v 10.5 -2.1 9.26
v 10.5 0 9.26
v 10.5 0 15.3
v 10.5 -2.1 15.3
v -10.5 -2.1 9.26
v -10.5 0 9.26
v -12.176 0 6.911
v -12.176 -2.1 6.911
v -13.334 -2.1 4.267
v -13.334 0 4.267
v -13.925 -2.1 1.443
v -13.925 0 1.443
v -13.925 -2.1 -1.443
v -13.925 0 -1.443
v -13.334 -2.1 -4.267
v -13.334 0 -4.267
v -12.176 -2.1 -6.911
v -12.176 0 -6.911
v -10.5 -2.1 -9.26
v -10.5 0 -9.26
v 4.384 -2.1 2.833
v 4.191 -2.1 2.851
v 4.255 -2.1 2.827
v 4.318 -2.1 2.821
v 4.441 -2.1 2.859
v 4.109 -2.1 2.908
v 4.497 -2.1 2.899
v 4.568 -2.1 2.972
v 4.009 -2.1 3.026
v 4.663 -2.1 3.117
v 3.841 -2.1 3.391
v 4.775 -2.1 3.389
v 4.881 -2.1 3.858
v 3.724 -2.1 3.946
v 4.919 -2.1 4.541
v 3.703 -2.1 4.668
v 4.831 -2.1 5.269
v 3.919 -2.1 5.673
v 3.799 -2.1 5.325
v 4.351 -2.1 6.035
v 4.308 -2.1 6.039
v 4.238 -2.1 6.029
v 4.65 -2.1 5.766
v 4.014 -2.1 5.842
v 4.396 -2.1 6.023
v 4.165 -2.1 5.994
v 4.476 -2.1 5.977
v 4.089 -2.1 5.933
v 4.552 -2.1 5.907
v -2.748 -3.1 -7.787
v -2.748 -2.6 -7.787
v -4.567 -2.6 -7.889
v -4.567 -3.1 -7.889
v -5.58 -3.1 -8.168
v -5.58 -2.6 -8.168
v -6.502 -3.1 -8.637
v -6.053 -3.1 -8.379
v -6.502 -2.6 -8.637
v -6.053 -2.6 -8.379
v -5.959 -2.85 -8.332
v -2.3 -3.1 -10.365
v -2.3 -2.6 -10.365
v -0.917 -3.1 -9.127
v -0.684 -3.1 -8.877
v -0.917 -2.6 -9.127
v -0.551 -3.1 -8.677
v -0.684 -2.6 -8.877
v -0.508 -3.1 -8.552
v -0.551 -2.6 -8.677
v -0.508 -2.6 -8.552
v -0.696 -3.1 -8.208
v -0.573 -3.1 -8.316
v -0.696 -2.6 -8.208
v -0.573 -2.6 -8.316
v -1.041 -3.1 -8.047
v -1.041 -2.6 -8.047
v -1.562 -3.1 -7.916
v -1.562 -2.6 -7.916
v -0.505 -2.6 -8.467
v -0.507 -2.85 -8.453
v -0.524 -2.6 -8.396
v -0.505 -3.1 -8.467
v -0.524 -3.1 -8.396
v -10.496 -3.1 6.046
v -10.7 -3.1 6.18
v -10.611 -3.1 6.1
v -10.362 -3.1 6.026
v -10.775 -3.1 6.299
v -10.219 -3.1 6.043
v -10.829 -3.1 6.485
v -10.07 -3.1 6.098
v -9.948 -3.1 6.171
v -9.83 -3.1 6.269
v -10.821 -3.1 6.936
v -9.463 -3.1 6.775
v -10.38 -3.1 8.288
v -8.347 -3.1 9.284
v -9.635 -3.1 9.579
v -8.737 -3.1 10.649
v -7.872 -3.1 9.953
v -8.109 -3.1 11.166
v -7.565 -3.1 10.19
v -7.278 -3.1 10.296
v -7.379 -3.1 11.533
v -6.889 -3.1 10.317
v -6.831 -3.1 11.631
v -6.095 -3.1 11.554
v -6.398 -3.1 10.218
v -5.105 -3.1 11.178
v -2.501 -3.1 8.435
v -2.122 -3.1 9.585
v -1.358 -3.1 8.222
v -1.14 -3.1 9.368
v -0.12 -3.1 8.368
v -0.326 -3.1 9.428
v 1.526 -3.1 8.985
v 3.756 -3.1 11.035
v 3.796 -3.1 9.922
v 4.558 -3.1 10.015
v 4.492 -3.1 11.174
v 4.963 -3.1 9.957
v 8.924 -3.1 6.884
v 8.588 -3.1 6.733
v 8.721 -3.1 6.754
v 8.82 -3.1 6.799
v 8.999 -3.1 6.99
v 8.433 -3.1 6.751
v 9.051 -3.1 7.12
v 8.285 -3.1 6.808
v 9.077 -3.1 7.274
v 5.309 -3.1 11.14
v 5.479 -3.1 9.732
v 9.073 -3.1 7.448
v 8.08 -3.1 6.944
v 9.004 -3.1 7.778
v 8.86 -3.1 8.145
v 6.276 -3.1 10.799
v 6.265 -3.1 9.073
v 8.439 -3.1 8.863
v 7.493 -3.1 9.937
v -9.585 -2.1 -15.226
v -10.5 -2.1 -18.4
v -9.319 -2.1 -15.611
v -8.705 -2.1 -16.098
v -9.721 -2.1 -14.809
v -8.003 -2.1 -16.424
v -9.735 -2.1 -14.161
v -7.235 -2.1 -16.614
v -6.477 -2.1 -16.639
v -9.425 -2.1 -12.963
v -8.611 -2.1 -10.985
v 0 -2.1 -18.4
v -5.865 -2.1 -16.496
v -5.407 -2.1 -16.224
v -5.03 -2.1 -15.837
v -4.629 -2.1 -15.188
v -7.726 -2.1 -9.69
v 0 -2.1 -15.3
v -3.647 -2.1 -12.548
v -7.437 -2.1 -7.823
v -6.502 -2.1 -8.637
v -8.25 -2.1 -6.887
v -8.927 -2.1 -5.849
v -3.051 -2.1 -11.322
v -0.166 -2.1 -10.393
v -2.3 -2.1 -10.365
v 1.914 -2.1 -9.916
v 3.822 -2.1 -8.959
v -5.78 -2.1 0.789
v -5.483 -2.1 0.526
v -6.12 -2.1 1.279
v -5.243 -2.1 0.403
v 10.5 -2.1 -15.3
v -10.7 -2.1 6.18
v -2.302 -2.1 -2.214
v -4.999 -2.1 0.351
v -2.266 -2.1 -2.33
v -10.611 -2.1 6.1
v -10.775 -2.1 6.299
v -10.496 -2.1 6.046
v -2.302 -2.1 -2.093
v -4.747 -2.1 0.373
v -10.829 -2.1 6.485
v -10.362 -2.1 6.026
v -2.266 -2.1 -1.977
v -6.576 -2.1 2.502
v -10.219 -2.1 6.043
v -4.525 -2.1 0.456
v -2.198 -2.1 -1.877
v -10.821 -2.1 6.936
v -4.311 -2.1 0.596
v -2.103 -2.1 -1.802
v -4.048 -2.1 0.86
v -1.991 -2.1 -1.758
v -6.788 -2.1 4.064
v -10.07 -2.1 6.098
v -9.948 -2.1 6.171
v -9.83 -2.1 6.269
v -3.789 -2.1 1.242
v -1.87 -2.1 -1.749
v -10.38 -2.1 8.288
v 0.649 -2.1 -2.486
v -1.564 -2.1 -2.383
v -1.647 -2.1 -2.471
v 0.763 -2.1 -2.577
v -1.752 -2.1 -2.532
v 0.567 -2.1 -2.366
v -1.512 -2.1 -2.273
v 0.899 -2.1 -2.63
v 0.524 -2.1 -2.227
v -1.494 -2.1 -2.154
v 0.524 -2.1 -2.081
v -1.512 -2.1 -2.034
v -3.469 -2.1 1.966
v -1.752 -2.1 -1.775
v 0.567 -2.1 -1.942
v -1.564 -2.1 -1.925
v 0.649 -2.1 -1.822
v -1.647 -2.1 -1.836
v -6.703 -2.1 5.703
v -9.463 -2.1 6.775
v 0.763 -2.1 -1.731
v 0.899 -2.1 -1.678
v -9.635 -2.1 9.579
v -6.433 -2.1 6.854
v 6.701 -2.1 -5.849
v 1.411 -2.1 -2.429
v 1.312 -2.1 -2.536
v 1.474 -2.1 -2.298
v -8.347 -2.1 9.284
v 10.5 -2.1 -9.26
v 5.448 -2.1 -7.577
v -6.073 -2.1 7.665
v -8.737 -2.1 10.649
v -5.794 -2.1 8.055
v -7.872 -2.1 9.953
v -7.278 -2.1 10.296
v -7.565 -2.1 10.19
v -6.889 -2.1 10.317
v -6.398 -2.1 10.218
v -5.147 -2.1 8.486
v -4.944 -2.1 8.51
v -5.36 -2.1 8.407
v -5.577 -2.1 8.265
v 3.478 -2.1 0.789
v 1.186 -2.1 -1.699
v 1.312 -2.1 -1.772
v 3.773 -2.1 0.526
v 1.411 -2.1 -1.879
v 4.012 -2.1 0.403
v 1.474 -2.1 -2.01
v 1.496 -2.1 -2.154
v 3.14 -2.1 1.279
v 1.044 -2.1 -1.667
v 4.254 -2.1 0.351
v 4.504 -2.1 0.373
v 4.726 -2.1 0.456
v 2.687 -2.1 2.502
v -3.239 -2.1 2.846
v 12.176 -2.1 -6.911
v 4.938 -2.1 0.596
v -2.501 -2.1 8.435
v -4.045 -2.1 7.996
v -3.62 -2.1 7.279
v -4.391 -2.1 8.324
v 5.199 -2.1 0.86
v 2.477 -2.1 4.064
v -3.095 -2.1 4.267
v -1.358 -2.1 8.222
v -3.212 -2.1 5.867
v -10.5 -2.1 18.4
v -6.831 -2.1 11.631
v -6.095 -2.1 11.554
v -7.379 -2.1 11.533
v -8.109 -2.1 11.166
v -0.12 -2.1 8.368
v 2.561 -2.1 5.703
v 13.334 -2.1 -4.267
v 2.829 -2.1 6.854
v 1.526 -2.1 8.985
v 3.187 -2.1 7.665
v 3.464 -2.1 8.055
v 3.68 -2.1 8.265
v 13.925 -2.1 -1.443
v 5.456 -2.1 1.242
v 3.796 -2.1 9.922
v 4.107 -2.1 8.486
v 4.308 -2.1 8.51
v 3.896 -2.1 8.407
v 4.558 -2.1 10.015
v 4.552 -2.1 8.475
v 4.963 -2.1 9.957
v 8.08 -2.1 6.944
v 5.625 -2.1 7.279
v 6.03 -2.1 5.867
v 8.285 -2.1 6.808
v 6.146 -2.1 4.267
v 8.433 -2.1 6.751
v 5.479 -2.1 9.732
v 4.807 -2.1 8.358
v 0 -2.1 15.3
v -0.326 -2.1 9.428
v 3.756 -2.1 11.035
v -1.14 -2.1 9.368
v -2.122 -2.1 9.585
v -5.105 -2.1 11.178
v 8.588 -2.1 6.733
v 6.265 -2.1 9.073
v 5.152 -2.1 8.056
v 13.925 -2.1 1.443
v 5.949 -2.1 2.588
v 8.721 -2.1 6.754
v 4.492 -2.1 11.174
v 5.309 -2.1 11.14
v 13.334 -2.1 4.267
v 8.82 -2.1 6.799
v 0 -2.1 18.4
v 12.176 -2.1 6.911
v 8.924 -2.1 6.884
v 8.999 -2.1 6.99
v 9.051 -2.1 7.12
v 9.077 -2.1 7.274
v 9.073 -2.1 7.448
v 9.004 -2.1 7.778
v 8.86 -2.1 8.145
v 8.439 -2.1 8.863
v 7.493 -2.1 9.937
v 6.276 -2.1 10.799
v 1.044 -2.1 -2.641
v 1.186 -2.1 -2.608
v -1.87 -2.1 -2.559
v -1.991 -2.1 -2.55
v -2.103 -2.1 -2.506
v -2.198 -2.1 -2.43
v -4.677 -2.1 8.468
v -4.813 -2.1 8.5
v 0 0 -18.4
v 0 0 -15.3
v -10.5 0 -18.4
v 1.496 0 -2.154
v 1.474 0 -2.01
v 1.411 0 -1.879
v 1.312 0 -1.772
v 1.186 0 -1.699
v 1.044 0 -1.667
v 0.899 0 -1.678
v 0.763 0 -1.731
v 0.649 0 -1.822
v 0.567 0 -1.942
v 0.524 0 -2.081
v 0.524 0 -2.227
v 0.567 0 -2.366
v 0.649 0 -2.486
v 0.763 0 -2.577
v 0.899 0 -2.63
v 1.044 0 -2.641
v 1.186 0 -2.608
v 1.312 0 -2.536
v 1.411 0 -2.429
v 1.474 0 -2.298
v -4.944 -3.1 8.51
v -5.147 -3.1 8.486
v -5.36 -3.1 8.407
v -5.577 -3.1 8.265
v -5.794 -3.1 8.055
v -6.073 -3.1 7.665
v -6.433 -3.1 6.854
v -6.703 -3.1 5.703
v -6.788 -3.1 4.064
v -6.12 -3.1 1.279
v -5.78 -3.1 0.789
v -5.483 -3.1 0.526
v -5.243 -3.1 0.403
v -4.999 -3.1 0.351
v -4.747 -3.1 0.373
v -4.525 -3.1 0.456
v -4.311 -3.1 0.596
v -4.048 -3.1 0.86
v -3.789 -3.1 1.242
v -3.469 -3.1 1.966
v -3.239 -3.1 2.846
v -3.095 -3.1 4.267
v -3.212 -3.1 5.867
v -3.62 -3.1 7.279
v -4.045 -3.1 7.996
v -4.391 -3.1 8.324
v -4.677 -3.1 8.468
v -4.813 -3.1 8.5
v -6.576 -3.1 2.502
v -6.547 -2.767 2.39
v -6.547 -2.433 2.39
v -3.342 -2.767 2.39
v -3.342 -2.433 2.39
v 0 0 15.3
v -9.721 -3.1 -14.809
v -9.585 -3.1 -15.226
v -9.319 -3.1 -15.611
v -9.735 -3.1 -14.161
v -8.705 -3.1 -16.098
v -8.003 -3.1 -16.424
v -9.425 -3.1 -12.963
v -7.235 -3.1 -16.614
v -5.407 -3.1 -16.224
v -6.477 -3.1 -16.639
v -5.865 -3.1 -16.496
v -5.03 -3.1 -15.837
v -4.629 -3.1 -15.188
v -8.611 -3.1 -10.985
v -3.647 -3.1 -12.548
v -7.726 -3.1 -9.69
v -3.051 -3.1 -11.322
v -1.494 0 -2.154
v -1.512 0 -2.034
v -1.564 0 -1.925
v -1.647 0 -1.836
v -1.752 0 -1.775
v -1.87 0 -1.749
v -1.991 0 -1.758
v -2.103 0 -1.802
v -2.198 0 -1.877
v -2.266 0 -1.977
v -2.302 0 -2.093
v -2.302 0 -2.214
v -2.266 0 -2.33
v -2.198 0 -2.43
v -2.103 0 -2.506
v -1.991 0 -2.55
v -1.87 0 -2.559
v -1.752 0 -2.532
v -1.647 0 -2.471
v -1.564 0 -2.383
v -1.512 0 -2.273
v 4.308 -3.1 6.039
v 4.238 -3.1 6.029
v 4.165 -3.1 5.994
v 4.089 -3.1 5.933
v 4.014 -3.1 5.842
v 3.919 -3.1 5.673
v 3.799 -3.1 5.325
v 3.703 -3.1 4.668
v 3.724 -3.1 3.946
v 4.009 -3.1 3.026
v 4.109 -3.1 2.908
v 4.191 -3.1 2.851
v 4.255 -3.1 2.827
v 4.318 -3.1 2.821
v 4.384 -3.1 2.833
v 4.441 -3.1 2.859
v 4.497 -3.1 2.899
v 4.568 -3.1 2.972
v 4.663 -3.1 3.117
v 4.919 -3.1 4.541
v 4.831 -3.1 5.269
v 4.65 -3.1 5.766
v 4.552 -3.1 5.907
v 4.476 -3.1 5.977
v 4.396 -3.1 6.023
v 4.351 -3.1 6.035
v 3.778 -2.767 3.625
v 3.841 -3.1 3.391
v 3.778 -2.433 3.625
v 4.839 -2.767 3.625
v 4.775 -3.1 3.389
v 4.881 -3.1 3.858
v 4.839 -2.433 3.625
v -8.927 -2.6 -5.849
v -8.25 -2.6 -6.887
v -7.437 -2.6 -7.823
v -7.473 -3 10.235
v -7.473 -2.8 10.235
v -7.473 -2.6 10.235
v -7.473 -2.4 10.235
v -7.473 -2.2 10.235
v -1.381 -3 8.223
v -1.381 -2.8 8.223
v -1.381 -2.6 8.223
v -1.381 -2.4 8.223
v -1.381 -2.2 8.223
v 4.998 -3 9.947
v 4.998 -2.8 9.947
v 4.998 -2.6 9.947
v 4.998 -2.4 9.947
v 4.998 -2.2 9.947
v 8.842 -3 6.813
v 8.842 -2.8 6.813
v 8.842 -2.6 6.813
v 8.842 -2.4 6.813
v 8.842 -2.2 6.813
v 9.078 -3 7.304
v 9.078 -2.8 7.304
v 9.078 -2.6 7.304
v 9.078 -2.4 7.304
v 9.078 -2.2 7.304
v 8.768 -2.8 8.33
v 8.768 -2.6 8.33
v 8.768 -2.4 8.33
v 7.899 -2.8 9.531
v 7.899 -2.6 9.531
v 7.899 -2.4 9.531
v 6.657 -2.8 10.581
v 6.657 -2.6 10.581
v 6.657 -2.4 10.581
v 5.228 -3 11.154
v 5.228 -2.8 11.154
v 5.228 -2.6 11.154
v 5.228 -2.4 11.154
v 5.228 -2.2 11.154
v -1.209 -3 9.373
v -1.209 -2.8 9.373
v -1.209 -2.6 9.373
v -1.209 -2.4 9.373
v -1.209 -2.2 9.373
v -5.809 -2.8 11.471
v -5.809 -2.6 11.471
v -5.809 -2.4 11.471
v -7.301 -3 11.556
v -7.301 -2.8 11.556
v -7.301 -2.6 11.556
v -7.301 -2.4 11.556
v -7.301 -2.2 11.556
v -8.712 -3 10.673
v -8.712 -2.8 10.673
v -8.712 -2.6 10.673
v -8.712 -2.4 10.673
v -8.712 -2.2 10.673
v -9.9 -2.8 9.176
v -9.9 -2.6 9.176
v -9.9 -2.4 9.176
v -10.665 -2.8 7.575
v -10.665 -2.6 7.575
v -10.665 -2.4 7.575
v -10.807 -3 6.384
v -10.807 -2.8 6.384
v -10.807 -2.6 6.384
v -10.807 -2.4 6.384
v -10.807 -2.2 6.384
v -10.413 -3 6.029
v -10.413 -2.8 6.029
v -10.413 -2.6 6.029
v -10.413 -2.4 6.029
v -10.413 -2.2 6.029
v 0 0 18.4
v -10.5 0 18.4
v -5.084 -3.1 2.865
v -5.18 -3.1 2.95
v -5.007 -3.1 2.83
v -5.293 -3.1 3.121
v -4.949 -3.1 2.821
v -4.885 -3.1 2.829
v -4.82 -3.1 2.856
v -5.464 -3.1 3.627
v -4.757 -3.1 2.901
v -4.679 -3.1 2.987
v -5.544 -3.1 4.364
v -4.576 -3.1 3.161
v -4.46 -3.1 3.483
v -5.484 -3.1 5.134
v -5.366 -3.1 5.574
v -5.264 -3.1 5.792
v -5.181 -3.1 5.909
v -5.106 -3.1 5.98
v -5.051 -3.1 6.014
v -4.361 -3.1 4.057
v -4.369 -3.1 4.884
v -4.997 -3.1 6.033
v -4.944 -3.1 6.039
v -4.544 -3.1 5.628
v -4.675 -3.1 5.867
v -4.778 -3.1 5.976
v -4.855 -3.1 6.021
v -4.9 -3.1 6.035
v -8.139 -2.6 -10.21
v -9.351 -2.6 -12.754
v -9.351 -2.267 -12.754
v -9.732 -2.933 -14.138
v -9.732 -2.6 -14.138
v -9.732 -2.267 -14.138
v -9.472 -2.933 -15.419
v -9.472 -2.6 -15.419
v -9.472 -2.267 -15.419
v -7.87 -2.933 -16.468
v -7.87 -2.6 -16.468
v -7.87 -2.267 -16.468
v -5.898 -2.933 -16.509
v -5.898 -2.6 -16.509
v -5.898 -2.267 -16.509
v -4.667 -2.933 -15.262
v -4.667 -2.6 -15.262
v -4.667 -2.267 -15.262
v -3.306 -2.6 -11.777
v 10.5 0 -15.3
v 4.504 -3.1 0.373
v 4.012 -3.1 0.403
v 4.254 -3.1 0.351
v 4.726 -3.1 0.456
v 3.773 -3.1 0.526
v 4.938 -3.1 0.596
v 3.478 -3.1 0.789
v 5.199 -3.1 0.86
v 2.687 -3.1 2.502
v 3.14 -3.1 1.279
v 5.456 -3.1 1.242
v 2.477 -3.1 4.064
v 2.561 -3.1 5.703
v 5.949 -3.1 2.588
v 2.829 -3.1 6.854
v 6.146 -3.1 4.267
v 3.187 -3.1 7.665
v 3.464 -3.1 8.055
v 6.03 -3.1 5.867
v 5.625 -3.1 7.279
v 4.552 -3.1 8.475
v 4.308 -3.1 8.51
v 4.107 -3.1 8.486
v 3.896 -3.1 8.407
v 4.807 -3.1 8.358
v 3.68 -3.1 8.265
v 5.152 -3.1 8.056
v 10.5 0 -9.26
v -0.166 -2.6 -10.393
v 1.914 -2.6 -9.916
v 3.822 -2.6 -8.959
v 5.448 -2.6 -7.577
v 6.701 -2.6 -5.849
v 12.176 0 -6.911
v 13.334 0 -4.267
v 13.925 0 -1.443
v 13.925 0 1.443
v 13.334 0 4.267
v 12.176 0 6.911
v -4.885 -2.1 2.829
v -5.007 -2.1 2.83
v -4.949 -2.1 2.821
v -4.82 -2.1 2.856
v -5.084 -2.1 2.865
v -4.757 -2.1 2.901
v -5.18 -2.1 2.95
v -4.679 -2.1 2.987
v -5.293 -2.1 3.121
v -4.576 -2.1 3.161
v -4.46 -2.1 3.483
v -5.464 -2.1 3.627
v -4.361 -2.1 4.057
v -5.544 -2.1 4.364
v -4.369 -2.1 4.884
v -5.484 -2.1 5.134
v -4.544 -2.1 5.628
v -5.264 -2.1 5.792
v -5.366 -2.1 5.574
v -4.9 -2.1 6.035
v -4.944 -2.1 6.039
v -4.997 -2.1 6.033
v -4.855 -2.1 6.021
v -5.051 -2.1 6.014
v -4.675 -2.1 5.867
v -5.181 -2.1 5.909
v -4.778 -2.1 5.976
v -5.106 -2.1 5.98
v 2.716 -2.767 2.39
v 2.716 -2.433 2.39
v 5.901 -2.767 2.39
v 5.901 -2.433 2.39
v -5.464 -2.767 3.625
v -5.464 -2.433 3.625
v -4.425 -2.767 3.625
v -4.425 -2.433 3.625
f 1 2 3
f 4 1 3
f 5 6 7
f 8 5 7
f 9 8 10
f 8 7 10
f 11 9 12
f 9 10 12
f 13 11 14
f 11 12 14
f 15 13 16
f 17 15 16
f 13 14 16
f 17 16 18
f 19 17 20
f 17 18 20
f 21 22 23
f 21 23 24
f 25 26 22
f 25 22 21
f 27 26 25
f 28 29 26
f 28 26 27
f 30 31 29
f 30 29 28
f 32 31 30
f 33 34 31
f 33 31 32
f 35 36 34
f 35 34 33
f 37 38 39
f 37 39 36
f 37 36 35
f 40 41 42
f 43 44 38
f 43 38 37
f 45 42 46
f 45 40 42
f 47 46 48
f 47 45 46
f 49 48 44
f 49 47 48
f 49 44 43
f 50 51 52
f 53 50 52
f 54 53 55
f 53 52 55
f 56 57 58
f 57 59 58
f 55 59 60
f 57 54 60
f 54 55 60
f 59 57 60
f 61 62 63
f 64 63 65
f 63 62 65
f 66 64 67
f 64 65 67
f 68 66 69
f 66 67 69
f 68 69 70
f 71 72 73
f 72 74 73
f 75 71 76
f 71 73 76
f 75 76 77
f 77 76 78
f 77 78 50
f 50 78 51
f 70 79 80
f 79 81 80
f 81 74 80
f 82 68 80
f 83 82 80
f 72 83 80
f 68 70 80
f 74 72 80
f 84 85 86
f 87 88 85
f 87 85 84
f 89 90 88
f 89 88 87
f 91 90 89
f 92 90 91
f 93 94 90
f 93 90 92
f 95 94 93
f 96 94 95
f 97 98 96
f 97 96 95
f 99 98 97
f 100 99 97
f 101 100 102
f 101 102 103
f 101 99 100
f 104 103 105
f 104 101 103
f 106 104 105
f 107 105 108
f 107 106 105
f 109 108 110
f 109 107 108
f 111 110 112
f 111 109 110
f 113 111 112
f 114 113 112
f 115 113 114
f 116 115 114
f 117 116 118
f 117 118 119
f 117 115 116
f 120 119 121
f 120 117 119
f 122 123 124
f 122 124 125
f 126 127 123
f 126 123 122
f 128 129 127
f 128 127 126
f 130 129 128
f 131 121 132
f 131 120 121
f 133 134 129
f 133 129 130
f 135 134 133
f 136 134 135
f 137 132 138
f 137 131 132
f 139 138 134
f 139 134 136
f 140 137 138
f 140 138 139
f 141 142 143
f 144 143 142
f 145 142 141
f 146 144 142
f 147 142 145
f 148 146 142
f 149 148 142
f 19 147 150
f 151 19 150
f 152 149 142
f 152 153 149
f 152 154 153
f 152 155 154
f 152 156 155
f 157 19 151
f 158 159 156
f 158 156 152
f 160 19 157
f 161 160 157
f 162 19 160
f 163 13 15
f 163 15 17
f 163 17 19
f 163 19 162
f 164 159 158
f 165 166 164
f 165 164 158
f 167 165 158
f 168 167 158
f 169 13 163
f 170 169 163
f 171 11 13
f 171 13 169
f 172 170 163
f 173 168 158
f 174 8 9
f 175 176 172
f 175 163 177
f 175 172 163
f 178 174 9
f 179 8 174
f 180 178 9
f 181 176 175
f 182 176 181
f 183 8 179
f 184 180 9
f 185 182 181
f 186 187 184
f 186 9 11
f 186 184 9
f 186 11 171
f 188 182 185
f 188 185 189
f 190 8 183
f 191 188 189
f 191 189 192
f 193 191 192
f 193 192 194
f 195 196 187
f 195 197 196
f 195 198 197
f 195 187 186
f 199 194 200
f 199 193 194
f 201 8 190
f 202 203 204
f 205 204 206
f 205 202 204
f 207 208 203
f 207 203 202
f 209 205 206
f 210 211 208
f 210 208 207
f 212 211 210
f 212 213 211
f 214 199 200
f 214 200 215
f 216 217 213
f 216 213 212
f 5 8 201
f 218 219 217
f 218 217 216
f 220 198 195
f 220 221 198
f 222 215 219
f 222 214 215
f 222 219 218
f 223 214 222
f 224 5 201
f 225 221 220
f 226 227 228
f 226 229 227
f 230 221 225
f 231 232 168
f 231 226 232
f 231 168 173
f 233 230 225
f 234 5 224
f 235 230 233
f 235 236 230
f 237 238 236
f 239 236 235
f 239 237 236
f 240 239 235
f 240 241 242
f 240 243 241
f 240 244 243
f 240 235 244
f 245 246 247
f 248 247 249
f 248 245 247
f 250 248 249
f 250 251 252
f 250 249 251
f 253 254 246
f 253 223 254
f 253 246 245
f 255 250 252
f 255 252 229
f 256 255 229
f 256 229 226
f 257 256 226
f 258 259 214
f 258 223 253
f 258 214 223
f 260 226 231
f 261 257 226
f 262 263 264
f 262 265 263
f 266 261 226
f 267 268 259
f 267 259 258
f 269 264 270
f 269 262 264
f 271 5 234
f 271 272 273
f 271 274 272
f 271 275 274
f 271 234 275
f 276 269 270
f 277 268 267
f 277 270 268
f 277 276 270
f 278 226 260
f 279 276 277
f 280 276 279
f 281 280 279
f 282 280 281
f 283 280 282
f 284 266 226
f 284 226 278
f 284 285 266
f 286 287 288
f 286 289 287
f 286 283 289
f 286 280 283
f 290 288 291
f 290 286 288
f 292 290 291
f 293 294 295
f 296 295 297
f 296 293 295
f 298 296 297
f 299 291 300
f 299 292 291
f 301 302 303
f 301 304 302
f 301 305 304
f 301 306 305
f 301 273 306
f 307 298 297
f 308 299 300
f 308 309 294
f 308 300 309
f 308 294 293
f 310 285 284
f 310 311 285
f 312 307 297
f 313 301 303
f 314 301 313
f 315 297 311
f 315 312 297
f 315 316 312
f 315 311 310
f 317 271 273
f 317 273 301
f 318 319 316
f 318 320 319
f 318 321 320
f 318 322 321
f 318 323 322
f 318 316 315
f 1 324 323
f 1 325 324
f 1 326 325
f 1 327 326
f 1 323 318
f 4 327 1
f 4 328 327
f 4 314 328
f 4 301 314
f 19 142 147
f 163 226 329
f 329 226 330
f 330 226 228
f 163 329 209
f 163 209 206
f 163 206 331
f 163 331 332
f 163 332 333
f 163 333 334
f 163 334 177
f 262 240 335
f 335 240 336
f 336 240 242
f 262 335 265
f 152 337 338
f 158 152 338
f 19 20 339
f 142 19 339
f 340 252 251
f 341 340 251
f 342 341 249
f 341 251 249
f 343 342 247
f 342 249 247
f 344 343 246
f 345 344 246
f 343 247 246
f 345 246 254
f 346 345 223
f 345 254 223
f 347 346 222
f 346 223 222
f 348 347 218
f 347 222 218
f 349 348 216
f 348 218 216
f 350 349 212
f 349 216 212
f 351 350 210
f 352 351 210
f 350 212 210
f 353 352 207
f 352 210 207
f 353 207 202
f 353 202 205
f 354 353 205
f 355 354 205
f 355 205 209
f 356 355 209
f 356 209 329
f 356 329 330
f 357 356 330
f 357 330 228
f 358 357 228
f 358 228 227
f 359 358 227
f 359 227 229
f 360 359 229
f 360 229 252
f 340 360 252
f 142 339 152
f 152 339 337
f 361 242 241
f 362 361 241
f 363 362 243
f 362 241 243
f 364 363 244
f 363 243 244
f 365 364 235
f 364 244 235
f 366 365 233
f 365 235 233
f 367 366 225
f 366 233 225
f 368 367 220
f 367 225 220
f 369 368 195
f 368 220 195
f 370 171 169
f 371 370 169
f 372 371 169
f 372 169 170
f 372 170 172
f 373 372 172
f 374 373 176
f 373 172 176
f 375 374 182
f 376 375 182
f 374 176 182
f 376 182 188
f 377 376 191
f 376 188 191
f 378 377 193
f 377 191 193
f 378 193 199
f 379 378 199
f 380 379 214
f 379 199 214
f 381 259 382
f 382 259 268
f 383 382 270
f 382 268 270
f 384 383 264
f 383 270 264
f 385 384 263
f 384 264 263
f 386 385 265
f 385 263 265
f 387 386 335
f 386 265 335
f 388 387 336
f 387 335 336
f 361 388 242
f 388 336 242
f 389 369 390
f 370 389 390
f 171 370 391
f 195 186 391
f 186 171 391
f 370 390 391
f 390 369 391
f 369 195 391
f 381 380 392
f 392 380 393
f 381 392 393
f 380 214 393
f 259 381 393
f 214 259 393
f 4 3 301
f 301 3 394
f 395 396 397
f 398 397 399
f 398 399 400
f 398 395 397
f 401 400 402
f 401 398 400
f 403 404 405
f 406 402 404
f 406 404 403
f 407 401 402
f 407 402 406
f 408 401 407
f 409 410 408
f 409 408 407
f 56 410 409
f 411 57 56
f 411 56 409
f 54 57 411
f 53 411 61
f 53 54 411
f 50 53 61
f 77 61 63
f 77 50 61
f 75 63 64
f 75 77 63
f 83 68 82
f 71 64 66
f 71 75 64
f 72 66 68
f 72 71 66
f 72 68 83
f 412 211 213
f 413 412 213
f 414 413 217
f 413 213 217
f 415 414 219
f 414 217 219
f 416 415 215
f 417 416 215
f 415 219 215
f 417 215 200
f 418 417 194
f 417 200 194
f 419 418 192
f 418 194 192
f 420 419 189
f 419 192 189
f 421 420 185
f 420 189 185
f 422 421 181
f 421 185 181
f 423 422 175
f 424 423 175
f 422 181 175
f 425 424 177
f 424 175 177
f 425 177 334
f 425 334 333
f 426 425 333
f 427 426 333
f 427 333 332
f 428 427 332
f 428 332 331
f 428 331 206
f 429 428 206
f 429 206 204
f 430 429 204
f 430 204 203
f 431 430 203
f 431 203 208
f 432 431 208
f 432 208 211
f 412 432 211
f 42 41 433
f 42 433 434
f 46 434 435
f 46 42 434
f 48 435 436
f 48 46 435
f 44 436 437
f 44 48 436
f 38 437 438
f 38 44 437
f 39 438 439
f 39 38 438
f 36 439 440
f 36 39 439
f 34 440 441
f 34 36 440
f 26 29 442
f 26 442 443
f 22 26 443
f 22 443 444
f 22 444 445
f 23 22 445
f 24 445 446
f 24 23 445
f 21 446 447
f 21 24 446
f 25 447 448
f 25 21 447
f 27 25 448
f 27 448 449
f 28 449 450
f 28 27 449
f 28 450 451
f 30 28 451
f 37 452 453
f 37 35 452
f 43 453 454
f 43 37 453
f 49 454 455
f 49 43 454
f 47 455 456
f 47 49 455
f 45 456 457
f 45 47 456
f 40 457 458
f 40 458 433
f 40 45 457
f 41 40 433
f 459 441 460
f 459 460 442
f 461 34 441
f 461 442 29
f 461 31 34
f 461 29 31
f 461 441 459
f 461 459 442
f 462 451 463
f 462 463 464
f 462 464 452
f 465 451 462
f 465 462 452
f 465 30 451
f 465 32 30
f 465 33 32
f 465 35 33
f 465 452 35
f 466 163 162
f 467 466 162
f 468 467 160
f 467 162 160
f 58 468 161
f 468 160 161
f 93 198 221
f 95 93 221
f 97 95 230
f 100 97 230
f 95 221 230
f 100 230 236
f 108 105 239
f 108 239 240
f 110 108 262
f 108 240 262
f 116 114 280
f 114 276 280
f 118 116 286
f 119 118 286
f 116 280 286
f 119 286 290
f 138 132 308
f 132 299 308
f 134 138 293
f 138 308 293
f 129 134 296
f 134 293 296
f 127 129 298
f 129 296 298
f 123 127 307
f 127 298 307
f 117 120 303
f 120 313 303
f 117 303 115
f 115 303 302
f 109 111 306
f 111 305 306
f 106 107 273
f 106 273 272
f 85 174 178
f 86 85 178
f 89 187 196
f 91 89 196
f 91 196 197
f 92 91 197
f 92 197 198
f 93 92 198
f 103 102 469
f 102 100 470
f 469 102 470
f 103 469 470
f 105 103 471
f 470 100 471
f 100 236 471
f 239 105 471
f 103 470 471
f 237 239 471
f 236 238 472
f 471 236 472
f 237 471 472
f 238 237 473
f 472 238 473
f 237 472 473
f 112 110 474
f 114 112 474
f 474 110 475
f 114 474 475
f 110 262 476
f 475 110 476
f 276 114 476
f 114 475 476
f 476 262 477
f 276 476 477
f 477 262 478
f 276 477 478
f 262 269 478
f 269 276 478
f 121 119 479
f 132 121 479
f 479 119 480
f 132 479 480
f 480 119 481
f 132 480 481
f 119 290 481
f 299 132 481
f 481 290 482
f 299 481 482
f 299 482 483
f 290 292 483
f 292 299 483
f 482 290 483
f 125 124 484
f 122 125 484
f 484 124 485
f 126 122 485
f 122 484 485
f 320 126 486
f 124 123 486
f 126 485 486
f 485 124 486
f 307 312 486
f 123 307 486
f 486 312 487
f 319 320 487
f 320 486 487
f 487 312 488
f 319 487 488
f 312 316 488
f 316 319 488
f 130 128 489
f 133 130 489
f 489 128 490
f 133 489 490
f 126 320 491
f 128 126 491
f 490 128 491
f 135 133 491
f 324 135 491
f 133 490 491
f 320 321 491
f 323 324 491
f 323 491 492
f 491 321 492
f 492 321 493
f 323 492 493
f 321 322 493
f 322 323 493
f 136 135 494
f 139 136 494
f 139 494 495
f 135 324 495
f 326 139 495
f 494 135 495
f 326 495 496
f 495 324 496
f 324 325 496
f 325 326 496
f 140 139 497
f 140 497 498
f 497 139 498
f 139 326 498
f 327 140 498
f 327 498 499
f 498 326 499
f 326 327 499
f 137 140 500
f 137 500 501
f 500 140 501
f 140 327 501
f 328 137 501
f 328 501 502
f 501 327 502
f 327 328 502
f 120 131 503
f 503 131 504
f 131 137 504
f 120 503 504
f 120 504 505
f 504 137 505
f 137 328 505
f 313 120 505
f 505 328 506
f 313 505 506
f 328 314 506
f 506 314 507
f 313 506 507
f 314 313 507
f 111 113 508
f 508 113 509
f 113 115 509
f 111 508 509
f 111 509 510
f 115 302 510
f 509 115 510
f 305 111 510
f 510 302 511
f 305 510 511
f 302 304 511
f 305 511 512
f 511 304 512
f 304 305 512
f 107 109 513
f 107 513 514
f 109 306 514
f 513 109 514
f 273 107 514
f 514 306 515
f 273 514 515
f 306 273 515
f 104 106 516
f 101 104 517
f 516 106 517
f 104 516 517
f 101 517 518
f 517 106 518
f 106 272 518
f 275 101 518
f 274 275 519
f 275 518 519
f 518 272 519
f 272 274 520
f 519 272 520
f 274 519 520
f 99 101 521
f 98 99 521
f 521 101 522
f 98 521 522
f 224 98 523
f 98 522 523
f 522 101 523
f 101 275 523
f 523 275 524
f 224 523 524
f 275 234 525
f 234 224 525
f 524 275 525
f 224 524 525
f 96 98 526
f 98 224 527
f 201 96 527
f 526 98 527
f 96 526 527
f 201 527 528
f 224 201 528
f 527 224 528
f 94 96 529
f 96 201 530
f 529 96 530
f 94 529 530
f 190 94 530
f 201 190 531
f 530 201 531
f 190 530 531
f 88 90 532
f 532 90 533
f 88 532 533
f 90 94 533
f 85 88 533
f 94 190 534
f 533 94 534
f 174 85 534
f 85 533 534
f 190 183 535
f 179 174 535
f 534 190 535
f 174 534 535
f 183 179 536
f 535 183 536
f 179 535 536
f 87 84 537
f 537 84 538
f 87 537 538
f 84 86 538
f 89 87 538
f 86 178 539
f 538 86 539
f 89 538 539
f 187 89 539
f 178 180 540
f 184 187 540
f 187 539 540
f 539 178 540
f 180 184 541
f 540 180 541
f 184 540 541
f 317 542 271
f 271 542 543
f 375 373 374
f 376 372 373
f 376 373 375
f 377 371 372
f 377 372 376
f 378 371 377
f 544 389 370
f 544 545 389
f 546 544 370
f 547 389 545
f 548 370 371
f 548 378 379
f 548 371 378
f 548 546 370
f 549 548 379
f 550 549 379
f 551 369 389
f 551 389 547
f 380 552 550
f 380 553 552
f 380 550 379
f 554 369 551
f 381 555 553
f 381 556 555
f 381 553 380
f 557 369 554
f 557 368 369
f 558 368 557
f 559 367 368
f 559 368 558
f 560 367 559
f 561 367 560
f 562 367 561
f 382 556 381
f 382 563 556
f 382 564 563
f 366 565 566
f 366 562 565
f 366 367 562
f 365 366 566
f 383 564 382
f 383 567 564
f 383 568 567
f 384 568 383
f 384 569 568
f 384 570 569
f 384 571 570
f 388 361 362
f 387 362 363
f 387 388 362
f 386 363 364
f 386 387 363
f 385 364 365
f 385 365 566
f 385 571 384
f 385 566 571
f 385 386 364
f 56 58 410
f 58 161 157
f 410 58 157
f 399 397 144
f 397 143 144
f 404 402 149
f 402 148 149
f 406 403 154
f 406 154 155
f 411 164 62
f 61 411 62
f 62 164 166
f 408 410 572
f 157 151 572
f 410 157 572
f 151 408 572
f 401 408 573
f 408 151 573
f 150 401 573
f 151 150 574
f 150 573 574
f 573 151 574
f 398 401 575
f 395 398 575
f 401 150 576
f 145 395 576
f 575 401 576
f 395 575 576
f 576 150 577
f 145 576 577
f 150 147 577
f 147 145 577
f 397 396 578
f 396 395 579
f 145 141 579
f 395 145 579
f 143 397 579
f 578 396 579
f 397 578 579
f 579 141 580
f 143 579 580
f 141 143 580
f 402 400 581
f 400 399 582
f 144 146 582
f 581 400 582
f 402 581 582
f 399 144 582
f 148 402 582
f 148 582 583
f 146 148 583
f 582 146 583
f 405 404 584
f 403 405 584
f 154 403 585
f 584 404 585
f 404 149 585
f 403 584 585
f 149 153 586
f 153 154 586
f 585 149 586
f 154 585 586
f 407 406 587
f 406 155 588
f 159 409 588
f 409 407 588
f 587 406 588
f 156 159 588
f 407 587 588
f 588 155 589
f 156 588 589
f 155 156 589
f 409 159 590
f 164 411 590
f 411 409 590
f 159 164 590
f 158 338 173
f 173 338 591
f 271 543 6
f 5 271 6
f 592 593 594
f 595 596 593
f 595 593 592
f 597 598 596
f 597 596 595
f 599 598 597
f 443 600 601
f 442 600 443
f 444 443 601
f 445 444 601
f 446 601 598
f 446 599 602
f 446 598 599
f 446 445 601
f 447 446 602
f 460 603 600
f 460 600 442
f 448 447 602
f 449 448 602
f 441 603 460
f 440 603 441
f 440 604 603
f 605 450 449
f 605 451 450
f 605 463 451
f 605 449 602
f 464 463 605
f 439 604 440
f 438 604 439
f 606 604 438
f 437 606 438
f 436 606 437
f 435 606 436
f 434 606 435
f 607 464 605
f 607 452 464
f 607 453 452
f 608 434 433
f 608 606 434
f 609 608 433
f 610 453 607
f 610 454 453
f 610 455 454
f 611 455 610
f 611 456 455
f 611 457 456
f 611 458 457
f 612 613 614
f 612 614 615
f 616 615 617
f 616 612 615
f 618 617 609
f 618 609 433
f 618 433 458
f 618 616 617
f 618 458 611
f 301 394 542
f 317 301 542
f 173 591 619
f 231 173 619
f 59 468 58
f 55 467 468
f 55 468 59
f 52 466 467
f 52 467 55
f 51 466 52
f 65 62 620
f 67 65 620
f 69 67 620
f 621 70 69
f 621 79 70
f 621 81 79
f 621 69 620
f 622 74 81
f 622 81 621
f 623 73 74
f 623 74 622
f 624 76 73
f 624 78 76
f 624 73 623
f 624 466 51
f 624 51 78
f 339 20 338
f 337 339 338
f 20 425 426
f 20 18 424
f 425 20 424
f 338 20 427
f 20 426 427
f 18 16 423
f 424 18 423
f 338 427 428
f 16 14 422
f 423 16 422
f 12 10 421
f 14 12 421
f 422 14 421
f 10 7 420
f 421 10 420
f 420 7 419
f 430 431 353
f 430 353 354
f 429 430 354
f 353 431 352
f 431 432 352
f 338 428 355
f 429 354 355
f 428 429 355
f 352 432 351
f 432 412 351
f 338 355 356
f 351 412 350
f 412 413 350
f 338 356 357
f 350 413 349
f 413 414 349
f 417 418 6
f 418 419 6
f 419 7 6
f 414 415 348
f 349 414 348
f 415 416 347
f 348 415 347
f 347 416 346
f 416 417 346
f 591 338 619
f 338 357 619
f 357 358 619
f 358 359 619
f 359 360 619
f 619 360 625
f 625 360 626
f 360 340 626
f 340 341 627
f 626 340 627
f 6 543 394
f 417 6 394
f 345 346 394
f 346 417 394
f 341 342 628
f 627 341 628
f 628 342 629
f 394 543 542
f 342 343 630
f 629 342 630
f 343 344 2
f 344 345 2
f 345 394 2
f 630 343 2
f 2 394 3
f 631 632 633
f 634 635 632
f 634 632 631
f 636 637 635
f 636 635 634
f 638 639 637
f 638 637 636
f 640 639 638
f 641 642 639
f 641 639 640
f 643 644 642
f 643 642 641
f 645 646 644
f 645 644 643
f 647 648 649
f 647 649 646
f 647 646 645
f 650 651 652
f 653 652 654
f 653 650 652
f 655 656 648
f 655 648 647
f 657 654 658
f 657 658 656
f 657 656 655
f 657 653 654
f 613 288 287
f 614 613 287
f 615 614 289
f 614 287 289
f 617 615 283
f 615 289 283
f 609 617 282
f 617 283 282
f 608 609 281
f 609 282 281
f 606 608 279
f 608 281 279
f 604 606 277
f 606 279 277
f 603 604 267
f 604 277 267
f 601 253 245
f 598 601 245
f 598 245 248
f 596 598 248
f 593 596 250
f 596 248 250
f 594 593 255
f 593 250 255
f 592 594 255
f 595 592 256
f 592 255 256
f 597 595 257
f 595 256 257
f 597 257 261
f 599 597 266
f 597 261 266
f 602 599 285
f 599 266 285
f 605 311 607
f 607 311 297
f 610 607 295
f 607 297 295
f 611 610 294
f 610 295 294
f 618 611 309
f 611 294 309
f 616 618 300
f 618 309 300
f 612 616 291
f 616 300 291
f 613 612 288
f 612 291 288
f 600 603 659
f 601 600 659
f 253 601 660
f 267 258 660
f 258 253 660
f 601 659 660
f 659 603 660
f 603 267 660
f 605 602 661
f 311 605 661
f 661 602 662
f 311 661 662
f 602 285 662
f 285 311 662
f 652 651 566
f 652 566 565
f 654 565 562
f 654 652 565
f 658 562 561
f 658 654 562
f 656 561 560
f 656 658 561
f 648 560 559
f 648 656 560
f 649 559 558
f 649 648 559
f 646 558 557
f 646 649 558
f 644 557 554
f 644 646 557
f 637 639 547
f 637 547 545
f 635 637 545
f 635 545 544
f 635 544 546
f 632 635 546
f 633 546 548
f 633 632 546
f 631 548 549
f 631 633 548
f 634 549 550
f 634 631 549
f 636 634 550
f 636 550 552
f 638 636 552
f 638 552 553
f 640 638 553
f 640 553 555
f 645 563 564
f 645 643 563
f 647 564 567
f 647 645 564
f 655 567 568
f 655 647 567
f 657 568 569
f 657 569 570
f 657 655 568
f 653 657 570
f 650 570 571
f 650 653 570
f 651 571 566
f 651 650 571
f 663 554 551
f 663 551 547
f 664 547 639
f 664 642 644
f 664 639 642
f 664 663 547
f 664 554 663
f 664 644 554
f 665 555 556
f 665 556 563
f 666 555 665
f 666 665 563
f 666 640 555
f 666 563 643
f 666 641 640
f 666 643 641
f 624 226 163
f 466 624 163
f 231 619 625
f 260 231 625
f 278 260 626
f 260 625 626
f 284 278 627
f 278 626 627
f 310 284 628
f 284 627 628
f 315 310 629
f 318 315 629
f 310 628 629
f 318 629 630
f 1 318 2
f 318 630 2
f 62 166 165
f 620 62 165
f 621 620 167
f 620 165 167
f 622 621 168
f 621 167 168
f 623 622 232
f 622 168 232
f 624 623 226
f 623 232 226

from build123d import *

# Parameters (mm, degrees)
F1_DEPTH = 2.1
F2_R     = 0.4883492614
F2_R_2   = 0.4063313189
F3_DEPTH = 25
F4_DEPTH = 1
F5_DEPTH = 0.5


with BuildPart() as f1:
    # F0 (on Front) → F1 (new body)
    with BuildSketch(Plane.XZ):
        with BuildLine():
            Line((-10.5, 18.4), (-10.5, 9.2601295887))
            ThreePointArc((-10.5, 9.2601295887), (-14, 0), (-10.5, -9.2601295887))
            Line((-10.5, -9.2601295887), (-10.5, -18.4))
            Line((-10.5, -18.4), (0, -18.4))
            Line((0, -18.4), (0, -15.3))
            Line((0, -15.3), (10.5, -15.3))
            Line((10.5, -15.3), (10.5, -9.2601295887))
            ThreePointArc((10.5, -9.2601295887), (14, 0), (10.5, 9.2601295887))
            Line((10.5, 9.2601295887), (10.5, 15.3))
            Line((10.5, 15.3), (0, 15.3))
            Line((0, 15.3), (0, 18.4))
            Line((0, 18.4), (-10.5, 18.4))
        make_face()
    extrude(amount=F1_DEPTH)

    # F2 (on face) → F3 (cut)
    with BuildSketch(Plane.XZ.offset(2.1)):
        with Locations((1.0072712321, -2.1537290886)):
            Circle(F2_R)
        with Locations((-1.9001974724, -2.1537290886)):
            Circle(F2_R_2)
    extrude(amount=-F3_DEPTH, mode=Mode.SUBTRACT)

    # F2 (on face) → F4 (join)
    with BuildSketch(Plane.XZ.offset(2.1)):
        with BuildLine():
            add(Edge.make_bspline(
                [(-9.829537943, 6.2690996565), (-9.0079139859, 7.0525339928), (-8.1620555875, 12.9171276073), (-1.2711703194, 5.8155205927), (5.1875775916, 12.3844979266), (7.9323570828, 6.1025672426), (9.9129431471, 7.414748035), (5.0242272403, 13.5560333346), (-1.2236991987, 6.9428523769), (-7.3257615774, 14.6230472142), (-11.8701250151, 6.0658118979), (-10.2089707518, 5.9073031337), (-9.829537943, 6.2690996565)],
                knots=[0, 0, 0, 0, 0.1008269557, 0.2197345761, 0.3404152051, 0.4410341374, 0.4857855194, 0.595336525, 0.7166600814, 0.8360867423, 0.9534372693, 1, 1, 1, 1], degree=3))
        make_face()
        with BuildLine():
            add(Edge.make_bspline(
                [(-4.9444967881, 8.510470856), (-8.1502829181, 8.510470856), (-6.5473898531, 2.389801899), (-4.9444967881, -3.730867058), (-3.3416037231, 2.389801899), (-1.738710658, 8.510470856), (-4.9444967881, 8.510470856)],
                knots=[0, 0, 0, 2.0943951024, 2.0943951024, 4.1887902048, 4.1887902048, 6.2831853072, 6.2831853072, 6.2831853072], degree=2, weights=[1, 0.5, 1, 0.5, 1, 0.5, 1]))
        make_face()
        with BuildLine():
            add(Edge.make_bspline(
                [(-4.9444967881, 6.0392147861), (-5.9832237951, 6.0392147861), (-5.4638602916, 3.6254299339), (-4.9444967881, 1.2116450816), (-4.4251332846, 3.6254299339), (-3.905769781, 6.0392147861), (-4.9444967881, 6.0392147861)],
                knots=[0, 0, 0, 2.0943951024, 2.0943951024, 4.1887902048, 4.1887902048, 6.2831853072, 6.2831853072, 6.2831853072], degree=2, weights=[1, 0.5, 1, 0.5, 1, 0.5, 1]))
        make_face(mode=Mode.SUBTRACT)
        with BuildLine():
            add(Edge.make_bspline(
                [(4.3083457276, 8.510470856), (1.1229755904, 8.510470856), (2.715660659, 2.389801899), (4.3083457276, -3.730867058), (5.9010307962, 2.389801899), (7.4937158648, 8.510470856), (4.3083457276, 8.510470856)],
                knots=[0, 0, 0, 2.0943951024, 2.0943951024, 4.1887902048, 4.1887902048, 6.2831853072, 6.2831853072, 6.2831853072], degree=2, weights=[1, 0.5, 1, 0.5, 1, 0.5, 1]))
        make_face()
        with BuildLine():
            add(Edge.make_bspline(
                [(4.3083457276, 6.0392147861), (3.2473717912, 6.0392147861), (3.7778587594, 3.6254299339), (4.3083457276, 1.2116450816), (4.8388326959, 3.6254299339), (5.3693196641, 6.0392147861), (4.3083457276, 6.0392147861)],
                knots=[0, 0, 0, 2.0943951024, 2.0943951024, 4.1887902048, 4.1887902048, 6.2831853072, 6.2831853072, 6.2831853072], degree=2, weights=[1, 0.5, 1, 0.5, 1, 0.5, 1]))
        make_face(mode=Mode.SUBTRACT)
        with BuildLine():
            ThreePointArc((-2.2997387979, -10.3645802836), (-4.5126640568, -9.7720787293), (-6.5023950834, -8.6367079814))
            add(Edge.make_bspline(
                [(-6.5023950834, -8.6367079814), (-7.1480490746, -9.0504727619), (-8.4142867998, -10.2988132014), (-9.3419195713, -12.6469034495), (-10.3868535035, -15.8161790247), (-5.2159255621, -17.543214943), (-3.9589557876, -13.2315806377), (-3.1690739286, -11.2494915586), (-2.2997387979, -10.3645802836)],
                knots=[0.1382922128, 0.1382922128, 0.1382922128, 0.1382922128, 0.223438935, 0.3305741163, 0.4348222448, 0.5581913657, 0.680074847, 0.7990907251, 0.7990907251, 0.7990907251, 0.7990907251], degree=3))
        make_face()
        with BuildLine():
            add(Edge.make_bspline(
                [(-2.7482081205, -7.7869482338), (-3.9633299887, -7.7307504346), (-5.2409611912, -7.913646006), (-6.3270688618, -8.5243508727), (-6.5023950834, -8.6367079814)],
                knots=[0, 0, 0, 0, 0.115170768, 0.1382922128, 0.1382922128, 0.1382922128, 0.1382922128], degree=3))
            ThreePointArc((-6.5023950834, -8.6367079814), (-4.5126640568, -9.7720787293), (-2.2997387979, -10.3645802836))
            add(Edge.make_bspline(
                [(-2.2997387979, -10.3645802836), (-1.5450723543, -9.5963922499), (0.6245191873, -8.2408264477), (-1.7185524071, -7.8345684656), (-2.7482081205, -7.7869482338)],
                knots=[0.7990907251, 0.7990907251, 0.7990907251, 0.7990907251, 0.9024079457, 1, 1, 1, 1], degree=3))
        make_face()
    extrude(amount=F4_DEPTH)

    # F2 (on face) → F5 (join)
    with BuildSketch(Plane.XZ.offset(2.1)):
        with BuildLine():
            Line((6.7010624334, -5.8486363851), (-8.9265769348, -5.8486363851))
            ThreePointArc((-8.9265769348, -5.8486363851), (-7.8600647438, -7.3692504701), (-6.5023950834, -8.6367079814))
            add(Edge.make_bspline(
                [(-2.7482081205, -7.7869482338), (-3.9633299887, -7.7307504346), (-5.2409611912, -7.913646006), (-6.3270688618, -8.5243508727), (-6.5023950834, -8.6367079814)],
                knots=[0, 0, 0, 0, 0.115170768, 0.1382922128, 0.1382922128, 0.1382922128, 0.1382922128], degree=3))
            add(Edge.make_bspline(
                [(-2.2997387979, -10.3645802836), (-1.5450723543, -9.5963922499), (0.6245191873, -8.2408264477), (-1.7185524071, -7.8345684656), (-2.7482081205, -7.7869482338)],
                knots=[0.7990907251, 0.7990907251, 0.7990907251, 0.7990907251, 0.9024079457, 1, 1, 1, 1], degree=3))
            ThreePointArc((-2.2997387979, -10.3645802836), (2.8968790479, -9.494250219), (6.7010624334, -5.8486363851))
        make_face()
    extrude(amount=F5_DEPTH)


solid = f1.part
